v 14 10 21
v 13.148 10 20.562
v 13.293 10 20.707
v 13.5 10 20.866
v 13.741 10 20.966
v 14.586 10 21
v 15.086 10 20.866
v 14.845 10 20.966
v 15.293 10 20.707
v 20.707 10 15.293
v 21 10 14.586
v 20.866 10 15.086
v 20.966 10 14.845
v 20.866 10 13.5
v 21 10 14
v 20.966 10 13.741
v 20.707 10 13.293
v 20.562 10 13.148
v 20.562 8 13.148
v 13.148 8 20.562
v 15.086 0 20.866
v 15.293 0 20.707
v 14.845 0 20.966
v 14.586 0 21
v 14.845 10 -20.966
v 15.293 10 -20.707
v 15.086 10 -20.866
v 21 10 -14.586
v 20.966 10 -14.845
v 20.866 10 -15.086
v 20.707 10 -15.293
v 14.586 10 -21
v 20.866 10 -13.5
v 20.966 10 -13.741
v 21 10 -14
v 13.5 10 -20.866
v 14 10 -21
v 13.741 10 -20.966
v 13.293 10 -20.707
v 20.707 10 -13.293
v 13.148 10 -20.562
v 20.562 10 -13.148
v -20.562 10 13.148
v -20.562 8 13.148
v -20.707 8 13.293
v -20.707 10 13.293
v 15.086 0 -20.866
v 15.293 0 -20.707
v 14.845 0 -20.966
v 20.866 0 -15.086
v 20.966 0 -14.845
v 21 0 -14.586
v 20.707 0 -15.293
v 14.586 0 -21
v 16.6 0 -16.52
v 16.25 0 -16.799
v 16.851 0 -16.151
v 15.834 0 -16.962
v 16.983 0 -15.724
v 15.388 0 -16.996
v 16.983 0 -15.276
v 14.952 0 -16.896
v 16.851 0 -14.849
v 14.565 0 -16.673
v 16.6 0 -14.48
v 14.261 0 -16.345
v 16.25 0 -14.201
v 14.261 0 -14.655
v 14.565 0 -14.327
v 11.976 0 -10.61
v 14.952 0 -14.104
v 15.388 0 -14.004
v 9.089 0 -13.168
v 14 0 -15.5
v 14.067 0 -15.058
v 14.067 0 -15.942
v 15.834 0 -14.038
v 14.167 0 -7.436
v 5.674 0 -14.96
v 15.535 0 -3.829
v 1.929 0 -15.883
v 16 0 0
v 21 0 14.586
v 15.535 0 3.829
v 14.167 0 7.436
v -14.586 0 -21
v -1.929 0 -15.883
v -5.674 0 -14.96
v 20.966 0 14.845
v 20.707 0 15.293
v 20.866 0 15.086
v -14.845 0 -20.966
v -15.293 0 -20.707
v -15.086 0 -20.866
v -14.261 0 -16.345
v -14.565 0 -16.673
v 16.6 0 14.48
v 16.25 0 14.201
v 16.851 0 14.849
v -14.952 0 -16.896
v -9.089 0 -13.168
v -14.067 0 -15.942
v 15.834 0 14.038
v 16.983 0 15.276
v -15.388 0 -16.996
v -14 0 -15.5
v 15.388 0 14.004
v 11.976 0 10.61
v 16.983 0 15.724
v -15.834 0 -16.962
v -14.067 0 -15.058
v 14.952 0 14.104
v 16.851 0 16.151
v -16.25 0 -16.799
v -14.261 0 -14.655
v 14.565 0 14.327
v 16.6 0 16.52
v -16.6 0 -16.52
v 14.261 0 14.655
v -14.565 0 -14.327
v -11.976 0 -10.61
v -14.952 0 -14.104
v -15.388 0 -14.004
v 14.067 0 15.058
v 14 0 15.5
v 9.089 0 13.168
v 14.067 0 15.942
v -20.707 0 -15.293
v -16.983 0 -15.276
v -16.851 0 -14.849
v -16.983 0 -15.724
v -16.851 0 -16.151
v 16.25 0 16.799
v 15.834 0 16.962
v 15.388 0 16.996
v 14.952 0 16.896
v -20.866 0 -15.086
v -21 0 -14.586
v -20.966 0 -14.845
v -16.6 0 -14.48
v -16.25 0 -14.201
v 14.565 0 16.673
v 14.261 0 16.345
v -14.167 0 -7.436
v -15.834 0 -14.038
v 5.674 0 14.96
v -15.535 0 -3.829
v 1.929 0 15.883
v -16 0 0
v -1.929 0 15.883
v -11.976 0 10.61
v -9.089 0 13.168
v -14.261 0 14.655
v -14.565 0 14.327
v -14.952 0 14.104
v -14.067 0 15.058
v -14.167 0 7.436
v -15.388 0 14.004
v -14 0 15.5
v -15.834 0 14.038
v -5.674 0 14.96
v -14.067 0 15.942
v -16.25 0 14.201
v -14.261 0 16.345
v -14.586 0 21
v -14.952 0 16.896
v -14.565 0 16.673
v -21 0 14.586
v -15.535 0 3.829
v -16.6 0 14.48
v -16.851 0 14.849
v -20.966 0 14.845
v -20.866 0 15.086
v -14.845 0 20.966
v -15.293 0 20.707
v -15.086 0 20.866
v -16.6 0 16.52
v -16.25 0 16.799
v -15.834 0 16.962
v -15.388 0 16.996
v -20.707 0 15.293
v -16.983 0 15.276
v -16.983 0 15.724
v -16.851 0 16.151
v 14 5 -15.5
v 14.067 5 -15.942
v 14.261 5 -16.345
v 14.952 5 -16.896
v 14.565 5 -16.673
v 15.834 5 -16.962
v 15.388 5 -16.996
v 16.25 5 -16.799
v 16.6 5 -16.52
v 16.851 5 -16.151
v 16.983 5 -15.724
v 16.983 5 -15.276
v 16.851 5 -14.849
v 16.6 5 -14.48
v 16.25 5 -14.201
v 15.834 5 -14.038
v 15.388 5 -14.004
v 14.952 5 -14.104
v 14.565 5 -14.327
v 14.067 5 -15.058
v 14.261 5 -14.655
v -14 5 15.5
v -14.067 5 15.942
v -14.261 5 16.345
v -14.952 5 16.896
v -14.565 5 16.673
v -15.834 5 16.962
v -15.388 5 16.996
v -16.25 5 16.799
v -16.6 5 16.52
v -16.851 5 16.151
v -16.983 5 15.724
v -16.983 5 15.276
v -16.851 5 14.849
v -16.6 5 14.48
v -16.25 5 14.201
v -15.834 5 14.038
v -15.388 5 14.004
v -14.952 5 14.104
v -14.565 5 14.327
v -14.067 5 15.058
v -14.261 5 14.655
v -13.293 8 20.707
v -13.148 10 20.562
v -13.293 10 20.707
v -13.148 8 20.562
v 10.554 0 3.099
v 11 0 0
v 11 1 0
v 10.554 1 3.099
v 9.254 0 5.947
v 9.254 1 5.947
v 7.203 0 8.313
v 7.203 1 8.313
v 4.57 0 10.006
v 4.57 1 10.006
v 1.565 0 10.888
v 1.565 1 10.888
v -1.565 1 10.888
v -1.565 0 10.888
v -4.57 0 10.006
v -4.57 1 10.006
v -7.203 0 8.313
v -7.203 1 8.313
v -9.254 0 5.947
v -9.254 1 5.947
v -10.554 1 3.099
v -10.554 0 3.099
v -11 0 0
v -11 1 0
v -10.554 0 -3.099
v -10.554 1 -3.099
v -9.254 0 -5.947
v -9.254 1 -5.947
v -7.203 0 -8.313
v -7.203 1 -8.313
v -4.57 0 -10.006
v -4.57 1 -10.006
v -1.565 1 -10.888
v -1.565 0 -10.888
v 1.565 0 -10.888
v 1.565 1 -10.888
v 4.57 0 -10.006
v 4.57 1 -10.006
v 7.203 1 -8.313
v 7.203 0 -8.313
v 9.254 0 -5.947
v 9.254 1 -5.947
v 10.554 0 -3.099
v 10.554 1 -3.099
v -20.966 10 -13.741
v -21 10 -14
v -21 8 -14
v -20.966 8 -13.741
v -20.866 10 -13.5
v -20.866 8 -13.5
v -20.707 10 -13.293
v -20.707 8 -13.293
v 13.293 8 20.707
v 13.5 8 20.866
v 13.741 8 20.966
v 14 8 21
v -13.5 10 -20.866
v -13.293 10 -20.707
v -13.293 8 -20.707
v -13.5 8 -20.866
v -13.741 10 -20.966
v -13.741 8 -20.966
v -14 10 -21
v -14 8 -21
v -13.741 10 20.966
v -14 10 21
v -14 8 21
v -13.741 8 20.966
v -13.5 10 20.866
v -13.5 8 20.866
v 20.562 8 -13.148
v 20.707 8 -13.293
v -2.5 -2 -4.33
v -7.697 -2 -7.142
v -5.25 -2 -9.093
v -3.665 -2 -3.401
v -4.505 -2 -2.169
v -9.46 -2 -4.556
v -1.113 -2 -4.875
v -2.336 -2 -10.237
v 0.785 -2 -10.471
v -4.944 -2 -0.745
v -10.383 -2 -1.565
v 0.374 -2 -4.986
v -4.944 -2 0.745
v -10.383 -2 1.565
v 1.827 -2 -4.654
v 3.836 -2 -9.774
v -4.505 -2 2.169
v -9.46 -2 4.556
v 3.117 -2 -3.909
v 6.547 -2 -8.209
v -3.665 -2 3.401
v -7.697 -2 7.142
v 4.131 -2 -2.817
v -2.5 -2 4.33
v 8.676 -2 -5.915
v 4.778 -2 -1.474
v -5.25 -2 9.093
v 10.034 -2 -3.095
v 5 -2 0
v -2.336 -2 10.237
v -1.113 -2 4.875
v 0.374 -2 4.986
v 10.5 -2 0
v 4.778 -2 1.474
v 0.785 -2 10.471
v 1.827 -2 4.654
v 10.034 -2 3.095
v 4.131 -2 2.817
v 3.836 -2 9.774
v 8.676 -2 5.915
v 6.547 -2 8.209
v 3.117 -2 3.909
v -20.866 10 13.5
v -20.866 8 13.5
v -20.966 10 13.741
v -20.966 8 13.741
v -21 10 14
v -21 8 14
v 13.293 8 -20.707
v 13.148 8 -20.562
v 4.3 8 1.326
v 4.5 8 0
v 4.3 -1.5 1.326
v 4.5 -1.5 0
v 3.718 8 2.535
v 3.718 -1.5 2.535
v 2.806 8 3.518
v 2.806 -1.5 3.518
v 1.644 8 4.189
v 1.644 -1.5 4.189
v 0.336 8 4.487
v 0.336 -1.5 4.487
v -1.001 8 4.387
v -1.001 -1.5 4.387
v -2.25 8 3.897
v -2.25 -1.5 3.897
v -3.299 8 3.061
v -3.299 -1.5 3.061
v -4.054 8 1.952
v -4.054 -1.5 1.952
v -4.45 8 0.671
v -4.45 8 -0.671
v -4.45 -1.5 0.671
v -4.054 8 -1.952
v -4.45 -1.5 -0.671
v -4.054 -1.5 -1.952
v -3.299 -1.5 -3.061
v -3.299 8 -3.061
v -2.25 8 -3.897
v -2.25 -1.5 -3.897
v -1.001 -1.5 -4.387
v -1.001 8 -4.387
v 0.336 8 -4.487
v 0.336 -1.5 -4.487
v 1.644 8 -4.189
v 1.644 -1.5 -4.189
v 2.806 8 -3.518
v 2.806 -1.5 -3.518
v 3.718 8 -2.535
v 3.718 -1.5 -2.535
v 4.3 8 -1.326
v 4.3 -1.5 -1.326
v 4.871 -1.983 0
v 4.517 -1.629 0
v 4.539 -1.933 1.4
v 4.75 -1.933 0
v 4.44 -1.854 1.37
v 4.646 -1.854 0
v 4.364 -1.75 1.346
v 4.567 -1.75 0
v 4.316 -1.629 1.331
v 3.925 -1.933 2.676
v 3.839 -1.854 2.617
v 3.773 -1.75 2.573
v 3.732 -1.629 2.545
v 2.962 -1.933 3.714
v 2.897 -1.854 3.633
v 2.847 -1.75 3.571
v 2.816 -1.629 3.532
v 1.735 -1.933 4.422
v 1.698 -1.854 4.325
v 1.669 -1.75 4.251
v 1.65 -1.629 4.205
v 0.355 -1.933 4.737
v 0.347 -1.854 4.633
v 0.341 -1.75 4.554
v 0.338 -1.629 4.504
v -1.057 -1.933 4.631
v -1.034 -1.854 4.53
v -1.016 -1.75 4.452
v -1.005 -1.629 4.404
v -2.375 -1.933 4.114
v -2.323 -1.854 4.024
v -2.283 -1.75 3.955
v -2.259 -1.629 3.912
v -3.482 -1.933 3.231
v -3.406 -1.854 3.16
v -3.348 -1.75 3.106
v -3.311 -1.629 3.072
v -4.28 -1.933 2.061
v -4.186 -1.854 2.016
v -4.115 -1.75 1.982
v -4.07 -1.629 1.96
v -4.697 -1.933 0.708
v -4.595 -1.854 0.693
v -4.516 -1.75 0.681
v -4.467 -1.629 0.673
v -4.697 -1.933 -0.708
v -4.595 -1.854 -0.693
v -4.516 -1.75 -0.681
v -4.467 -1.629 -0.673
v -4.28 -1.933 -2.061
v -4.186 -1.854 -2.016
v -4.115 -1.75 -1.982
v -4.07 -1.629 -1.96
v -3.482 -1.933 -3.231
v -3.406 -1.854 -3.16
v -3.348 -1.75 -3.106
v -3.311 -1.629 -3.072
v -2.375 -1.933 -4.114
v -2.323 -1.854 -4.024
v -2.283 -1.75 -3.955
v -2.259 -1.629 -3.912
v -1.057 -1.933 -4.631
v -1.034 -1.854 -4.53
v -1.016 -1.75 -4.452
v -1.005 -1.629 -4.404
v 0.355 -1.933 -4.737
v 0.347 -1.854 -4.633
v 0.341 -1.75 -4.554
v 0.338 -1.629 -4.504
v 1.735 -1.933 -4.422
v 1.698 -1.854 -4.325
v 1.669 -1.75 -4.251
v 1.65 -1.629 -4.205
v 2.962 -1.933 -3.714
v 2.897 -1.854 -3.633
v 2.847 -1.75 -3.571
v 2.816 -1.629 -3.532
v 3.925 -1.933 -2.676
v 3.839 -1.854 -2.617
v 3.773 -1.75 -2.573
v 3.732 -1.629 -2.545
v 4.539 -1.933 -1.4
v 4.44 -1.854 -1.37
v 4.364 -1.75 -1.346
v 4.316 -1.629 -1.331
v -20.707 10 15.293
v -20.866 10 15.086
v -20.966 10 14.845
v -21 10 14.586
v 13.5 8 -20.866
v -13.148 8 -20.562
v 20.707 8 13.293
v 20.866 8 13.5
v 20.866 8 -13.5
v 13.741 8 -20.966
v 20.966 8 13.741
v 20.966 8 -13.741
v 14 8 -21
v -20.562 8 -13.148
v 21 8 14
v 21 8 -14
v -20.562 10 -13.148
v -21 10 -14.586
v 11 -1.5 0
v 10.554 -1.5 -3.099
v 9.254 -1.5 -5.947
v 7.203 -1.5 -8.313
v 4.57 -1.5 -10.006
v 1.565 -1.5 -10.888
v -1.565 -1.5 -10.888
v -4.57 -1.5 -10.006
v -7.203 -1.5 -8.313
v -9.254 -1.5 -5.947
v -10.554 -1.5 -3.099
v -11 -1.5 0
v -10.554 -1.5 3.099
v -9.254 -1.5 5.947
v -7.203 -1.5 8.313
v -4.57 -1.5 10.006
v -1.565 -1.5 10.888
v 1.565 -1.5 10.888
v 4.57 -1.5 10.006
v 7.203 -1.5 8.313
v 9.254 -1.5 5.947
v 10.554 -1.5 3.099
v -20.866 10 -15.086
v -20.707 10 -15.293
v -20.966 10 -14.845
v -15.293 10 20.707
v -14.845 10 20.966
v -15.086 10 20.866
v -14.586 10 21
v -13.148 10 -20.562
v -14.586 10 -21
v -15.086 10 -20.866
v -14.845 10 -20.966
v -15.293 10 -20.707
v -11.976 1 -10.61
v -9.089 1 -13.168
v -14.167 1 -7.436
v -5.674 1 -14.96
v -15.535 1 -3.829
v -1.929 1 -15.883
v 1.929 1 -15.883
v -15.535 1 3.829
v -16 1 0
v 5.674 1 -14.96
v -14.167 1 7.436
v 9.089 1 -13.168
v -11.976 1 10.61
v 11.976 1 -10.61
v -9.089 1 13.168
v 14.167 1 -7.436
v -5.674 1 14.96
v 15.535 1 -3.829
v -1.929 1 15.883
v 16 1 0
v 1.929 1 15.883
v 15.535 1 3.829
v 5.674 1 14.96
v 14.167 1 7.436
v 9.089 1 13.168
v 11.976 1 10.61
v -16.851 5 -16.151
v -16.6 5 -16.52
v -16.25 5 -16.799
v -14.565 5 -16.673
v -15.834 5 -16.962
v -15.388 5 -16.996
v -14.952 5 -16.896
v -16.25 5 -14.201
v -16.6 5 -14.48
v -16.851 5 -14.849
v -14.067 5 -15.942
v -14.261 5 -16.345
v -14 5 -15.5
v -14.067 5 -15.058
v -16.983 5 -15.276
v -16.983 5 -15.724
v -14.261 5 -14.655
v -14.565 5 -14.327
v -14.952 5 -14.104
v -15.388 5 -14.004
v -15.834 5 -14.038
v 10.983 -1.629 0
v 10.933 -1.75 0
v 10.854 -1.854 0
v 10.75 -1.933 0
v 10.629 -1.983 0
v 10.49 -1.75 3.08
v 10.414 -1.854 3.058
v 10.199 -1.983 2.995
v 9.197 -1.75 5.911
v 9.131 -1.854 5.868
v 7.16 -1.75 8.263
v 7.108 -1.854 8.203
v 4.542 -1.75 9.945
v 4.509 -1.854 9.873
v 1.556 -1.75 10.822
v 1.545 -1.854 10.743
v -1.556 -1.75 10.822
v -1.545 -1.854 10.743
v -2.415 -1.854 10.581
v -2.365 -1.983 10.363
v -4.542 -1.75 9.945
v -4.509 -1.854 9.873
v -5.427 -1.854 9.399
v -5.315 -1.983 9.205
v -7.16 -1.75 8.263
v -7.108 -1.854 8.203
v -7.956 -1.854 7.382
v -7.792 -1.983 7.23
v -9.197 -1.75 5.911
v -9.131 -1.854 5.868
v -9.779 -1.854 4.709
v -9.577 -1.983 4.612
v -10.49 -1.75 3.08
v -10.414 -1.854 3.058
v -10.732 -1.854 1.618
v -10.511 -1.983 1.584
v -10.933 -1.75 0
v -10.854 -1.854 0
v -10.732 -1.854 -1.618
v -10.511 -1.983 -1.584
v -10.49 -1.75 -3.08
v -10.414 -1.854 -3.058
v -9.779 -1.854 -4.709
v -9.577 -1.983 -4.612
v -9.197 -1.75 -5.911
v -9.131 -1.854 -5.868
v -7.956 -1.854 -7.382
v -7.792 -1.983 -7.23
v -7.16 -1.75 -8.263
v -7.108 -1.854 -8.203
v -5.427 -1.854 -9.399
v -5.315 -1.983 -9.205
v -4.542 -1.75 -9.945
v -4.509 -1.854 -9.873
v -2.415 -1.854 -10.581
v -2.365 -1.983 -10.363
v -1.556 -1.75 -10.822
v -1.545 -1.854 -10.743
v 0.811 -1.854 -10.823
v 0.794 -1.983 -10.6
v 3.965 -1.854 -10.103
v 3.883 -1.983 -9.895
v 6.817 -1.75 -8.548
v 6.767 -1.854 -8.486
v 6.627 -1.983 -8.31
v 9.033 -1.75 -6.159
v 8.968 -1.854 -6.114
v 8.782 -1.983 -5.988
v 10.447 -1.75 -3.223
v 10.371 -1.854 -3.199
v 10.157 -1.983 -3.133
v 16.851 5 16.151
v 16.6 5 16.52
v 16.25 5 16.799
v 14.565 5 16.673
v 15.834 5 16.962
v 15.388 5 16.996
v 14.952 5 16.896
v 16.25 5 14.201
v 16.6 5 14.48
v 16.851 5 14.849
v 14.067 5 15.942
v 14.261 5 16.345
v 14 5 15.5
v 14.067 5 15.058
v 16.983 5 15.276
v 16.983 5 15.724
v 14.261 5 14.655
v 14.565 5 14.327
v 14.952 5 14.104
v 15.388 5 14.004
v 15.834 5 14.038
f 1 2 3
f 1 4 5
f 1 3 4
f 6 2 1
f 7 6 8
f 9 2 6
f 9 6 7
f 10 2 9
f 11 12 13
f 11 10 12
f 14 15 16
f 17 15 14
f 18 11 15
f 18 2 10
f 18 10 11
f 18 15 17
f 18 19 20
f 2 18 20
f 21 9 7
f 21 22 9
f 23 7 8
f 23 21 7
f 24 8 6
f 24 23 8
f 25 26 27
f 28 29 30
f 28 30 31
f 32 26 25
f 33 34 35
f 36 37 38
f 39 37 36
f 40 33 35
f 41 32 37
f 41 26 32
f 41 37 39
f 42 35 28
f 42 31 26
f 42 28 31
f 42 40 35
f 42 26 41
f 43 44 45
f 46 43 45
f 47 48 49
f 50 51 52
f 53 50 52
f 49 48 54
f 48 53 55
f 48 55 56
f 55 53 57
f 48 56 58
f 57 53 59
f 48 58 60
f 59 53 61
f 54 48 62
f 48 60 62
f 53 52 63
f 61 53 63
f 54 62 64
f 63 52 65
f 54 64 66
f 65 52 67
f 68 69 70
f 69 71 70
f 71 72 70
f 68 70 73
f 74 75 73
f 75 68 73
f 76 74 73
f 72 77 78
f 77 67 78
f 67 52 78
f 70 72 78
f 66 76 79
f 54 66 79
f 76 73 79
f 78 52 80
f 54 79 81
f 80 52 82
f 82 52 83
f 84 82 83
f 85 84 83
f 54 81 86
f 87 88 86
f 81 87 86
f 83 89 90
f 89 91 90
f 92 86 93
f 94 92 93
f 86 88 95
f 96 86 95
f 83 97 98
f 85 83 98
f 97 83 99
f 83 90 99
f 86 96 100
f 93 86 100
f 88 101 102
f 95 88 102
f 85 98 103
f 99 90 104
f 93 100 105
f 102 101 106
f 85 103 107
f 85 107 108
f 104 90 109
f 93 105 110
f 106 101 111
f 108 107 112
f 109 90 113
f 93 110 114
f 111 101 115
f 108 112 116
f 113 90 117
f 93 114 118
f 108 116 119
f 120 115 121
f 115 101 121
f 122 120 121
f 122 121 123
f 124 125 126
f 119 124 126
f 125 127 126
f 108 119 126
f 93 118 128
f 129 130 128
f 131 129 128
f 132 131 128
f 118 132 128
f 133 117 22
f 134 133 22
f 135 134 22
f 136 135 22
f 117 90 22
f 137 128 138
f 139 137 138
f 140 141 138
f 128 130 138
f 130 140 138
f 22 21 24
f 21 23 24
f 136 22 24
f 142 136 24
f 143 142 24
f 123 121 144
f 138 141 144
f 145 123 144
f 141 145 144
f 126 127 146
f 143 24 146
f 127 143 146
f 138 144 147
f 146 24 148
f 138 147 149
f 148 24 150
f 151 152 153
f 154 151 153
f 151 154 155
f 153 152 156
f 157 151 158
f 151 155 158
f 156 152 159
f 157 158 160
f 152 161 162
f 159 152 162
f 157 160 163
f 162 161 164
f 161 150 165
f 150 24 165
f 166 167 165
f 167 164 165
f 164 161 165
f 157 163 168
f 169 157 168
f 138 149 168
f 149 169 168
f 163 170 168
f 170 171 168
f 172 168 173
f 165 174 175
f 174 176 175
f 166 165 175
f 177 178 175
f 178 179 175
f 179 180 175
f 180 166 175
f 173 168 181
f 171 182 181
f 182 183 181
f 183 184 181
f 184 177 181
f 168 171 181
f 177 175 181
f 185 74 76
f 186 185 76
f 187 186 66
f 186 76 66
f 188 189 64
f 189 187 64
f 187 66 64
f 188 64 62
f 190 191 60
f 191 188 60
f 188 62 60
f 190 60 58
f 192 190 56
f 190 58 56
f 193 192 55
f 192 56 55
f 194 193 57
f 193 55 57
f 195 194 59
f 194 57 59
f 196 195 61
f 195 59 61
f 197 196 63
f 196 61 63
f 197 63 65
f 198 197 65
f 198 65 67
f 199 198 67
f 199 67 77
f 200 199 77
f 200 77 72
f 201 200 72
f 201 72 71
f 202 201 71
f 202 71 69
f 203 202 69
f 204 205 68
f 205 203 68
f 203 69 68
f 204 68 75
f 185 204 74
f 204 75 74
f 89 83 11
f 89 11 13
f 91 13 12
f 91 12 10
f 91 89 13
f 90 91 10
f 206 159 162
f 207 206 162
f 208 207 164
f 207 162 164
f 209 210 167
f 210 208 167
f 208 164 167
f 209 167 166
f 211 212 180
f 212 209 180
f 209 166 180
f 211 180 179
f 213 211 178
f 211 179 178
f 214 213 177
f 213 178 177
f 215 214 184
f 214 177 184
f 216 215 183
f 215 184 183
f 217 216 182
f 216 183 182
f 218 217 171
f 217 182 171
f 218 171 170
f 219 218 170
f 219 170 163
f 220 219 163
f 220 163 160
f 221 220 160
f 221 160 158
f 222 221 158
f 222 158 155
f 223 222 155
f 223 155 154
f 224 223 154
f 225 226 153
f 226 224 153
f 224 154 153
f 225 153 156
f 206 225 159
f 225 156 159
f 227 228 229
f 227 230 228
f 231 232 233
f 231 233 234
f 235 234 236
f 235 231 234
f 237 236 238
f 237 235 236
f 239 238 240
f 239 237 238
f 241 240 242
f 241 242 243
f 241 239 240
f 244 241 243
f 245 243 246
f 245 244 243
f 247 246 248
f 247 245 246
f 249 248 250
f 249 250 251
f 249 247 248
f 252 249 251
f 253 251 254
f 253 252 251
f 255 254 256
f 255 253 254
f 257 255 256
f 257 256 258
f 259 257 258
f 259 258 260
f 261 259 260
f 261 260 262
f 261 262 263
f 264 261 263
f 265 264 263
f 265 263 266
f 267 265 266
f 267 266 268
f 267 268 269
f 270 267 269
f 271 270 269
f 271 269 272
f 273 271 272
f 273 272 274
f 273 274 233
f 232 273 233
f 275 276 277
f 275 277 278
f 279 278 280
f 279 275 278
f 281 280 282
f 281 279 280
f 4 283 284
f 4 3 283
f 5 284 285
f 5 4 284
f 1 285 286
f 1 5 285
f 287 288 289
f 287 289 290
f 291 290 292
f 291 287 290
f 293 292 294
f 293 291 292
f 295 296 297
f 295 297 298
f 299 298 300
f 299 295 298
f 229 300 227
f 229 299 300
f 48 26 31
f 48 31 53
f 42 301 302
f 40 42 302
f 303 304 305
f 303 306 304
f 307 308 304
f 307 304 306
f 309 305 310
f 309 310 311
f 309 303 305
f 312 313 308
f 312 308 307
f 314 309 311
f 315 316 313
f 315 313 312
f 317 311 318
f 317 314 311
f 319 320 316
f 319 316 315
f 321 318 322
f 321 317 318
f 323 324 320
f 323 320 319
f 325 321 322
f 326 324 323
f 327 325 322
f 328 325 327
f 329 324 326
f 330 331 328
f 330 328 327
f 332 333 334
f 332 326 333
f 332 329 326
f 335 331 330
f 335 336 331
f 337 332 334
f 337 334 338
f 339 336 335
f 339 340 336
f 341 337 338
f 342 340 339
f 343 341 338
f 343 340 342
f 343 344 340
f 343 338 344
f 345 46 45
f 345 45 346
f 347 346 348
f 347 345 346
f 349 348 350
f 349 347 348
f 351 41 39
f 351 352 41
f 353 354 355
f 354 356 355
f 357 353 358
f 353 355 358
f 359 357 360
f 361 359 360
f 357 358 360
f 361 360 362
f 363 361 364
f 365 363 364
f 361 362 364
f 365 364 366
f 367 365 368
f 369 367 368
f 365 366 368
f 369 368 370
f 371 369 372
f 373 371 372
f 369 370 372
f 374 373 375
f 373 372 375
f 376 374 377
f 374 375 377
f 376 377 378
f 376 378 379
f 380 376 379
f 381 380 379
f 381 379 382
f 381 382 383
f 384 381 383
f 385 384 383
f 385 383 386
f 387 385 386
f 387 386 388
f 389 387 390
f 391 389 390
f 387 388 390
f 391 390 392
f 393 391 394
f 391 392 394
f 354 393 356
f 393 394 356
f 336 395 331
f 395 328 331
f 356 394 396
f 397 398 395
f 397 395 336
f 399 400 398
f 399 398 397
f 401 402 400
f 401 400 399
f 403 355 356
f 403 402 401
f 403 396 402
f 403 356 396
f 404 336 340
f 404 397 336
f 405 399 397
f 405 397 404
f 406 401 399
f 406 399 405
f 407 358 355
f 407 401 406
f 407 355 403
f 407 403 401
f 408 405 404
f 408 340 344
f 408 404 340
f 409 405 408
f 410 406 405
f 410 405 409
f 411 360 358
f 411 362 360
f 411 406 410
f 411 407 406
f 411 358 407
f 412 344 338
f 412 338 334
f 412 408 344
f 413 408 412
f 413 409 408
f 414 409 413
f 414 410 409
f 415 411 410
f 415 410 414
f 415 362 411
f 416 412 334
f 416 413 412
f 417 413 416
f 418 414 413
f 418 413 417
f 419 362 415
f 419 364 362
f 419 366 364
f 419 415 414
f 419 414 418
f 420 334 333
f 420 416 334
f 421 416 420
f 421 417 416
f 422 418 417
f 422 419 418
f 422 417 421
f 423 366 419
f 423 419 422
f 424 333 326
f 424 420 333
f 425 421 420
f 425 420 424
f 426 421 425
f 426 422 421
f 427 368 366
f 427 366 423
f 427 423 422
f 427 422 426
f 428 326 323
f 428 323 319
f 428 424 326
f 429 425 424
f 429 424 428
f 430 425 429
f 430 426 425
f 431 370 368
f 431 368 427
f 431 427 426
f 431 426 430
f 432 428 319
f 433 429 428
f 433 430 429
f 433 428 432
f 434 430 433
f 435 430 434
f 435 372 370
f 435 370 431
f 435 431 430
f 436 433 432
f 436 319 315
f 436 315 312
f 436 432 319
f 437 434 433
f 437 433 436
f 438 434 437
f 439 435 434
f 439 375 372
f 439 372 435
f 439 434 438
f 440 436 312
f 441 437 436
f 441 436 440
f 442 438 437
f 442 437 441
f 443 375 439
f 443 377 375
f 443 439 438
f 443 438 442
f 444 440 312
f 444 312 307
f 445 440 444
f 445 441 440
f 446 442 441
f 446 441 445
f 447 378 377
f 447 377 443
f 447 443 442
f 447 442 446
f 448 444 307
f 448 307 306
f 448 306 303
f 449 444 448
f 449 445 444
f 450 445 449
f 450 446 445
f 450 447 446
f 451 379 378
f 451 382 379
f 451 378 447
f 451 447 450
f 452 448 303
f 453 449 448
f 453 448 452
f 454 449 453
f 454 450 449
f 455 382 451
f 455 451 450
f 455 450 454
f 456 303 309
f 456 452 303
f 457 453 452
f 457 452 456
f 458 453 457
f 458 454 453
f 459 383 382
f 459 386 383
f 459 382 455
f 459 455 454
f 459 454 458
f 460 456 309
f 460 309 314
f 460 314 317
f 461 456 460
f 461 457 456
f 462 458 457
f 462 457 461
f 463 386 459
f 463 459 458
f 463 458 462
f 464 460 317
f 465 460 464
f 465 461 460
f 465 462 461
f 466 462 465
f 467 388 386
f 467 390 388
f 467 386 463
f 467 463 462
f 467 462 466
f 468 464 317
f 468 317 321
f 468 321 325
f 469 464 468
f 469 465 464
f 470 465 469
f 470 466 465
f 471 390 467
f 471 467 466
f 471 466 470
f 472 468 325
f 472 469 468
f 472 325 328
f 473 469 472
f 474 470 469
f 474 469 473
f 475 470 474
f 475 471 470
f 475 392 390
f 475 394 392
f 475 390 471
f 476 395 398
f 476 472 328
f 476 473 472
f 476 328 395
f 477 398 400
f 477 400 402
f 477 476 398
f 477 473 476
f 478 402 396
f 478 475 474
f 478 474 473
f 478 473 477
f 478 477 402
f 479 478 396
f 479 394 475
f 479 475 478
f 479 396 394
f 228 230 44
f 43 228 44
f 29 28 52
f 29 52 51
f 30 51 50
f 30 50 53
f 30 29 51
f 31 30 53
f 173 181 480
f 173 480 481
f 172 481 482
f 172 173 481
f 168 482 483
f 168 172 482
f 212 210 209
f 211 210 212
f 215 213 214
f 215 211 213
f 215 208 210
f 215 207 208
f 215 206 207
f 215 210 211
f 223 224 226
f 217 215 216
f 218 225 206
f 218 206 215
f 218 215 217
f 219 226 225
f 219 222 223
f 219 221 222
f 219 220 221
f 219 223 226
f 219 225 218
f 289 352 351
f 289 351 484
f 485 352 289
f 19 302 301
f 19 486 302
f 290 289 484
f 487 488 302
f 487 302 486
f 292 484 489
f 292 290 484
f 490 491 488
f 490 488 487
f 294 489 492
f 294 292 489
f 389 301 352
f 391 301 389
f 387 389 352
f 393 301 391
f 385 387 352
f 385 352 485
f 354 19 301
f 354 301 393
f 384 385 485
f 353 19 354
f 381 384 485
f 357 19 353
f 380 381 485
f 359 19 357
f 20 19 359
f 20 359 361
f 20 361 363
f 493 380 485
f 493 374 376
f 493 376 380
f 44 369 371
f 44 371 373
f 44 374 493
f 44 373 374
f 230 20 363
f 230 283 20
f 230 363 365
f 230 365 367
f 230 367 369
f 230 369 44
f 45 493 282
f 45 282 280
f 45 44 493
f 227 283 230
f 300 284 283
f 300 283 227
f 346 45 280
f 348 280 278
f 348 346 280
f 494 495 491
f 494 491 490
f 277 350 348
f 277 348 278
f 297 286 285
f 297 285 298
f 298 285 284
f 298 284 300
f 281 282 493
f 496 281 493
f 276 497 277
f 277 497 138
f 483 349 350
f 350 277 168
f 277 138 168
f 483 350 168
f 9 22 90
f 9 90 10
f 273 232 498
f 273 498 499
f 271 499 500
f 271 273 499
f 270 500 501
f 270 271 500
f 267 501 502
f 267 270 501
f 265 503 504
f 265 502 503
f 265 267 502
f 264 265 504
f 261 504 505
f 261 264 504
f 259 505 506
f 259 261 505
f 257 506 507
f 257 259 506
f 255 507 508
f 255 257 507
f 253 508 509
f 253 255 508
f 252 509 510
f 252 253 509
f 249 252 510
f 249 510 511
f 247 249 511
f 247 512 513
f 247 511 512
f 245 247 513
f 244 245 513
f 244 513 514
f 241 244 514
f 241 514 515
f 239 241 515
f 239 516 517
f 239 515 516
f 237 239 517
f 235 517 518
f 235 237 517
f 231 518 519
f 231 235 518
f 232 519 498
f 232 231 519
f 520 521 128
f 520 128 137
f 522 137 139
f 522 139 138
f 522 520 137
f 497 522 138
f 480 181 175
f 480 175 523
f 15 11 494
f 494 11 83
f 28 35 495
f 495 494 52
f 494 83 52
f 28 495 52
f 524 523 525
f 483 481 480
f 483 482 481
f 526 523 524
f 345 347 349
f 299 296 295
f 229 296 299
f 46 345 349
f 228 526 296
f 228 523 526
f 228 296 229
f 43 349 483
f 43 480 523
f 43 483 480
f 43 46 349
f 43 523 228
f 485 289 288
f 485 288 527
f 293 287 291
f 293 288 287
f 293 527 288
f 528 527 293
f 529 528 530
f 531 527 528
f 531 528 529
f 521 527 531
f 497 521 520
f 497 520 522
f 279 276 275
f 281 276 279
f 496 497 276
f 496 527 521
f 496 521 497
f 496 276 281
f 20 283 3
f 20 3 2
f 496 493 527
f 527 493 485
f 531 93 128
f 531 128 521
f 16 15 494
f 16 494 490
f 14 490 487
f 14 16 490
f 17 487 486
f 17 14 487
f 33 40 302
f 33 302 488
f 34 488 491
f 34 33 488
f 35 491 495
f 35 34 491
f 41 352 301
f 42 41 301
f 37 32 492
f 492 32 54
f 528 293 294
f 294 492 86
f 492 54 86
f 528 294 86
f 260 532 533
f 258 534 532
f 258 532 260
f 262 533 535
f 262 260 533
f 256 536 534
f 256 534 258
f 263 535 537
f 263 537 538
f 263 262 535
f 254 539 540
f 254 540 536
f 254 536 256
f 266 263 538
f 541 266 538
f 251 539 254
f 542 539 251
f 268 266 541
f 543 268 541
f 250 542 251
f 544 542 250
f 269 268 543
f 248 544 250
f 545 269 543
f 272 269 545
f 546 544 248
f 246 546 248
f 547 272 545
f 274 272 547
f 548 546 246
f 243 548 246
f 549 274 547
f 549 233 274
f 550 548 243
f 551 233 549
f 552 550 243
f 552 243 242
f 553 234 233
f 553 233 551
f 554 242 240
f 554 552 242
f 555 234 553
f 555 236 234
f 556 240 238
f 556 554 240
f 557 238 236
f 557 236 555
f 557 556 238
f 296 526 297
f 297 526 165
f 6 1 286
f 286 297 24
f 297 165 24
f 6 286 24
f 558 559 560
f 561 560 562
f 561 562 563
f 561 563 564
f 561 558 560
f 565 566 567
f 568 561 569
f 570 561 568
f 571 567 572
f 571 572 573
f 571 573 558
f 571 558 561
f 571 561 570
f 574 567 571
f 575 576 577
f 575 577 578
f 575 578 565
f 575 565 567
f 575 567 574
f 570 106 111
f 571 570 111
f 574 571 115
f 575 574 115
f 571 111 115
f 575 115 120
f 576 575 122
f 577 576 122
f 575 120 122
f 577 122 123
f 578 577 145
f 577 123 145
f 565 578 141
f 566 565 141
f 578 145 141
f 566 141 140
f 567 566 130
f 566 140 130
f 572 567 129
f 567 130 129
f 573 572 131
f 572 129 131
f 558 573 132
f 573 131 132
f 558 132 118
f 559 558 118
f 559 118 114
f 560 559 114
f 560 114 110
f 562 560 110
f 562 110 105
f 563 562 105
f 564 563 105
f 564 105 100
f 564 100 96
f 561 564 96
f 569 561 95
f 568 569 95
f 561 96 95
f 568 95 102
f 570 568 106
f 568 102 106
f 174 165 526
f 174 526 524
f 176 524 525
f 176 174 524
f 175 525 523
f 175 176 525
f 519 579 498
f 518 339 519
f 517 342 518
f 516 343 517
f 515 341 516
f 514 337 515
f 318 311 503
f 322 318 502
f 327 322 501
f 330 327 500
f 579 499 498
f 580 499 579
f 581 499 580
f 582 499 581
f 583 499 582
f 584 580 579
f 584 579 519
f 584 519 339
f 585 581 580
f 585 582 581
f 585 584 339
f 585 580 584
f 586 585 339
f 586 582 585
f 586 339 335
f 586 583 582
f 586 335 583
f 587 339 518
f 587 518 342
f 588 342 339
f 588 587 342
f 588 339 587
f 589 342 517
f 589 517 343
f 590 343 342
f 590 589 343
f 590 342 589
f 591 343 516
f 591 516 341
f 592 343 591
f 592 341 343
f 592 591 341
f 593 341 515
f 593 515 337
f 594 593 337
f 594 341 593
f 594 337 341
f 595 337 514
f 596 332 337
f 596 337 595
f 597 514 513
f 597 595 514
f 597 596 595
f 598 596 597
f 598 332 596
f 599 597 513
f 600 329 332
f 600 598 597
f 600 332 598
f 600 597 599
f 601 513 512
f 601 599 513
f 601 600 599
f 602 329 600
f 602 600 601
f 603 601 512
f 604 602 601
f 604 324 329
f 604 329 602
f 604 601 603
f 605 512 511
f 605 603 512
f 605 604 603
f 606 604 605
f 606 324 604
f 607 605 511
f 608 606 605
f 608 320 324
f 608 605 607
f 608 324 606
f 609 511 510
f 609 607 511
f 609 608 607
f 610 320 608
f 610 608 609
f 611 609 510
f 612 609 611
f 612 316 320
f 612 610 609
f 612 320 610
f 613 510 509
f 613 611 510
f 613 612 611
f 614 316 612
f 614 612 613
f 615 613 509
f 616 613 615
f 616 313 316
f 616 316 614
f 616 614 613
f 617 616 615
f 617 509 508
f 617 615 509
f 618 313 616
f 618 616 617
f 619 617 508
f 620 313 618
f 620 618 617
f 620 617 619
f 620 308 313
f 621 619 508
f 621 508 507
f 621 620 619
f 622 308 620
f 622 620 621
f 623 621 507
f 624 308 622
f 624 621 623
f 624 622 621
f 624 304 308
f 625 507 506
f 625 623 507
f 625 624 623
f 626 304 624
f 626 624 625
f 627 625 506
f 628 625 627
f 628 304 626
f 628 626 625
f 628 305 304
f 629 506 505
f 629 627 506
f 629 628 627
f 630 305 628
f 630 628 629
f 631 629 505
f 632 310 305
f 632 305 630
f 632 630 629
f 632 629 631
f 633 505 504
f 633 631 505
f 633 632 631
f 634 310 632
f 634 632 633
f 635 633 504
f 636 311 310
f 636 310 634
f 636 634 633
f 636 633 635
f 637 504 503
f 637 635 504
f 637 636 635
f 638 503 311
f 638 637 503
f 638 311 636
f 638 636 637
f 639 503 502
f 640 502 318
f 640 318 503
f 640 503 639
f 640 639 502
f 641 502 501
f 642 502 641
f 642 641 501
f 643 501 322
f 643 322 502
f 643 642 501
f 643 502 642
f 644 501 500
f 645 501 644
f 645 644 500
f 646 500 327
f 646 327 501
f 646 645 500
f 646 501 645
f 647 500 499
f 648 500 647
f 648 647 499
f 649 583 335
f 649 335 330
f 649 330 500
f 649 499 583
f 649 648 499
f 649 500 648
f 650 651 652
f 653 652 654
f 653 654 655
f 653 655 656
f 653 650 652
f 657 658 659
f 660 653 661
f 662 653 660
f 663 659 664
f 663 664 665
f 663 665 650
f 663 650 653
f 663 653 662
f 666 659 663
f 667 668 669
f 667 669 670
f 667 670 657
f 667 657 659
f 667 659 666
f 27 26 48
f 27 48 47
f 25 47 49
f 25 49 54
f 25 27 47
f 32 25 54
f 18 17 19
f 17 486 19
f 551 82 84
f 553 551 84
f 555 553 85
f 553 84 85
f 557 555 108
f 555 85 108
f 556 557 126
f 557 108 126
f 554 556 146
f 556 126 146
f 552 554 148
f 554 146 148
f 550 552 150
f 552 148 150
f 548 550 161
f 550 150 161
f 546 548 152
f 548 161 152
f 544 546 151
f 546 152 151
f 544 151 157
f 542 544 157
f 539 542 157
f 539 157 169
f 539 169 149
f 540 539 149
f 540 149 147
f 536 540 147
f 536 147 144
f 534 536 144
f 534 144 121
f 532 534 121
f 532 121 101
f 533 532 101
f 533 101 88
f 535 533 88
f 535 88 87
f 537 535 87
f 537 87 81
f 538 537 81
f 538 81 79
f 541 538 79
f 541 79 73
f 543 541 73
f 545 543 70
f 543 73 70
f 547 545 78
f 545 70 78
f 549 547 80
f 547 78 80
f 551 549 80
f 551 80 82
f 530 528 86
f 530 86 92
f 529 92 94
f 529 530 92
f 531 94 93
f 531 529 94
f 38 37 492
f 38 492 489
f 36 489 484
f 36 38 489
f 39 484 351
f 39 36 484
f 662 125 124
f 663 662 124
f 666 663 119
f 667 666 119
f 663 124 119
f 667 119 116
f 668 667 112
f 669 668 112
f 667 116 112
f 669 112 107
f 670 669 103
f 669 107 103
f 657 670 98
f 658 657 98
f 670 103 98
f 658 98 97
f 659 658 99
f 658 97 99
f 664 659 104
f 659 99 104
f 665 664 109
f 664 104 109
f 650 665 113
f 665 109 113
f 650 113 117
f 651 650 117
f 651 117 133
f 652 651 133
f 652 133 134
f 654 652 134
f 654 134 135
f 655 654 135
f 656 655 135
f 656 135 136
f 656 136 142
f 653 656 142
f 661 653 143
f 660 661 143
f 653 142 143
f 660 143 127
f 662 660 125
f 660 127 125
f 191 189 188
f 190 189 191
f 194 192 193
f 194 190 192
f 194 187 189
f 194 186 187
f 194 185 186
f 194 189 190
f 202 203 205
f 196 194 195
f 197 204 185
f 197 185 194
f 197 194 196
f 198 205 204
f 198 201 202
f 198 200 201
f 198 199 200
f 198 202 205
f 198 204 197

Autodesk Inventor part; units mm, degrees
ref_plane "YZ Plane" through (0, 0, 0) normal (1, 0, 0) x (0, 1, 0)
ref_plane "XZ Plane" through (0, 0, 0) normal (0, 1, 0) x (-1, 0, 0)
ref_plane "XY Plane" through (0, 0, 0) normal (0, 0, 1) x (1, 0, 0)
sketch "Sketch1" plane through (0, 0, 0) normal (0, 1, 0) x (-1, 0, 0)
  line L0 (-21, -21) -> (21, -21)
  line L1 (21, -21) -> (21, 21)
  line L2 (21, 21) -> (-21, 21)
  line L3 (-21, 21) -> (-21, -21)
  line L4 (-21, -21) -> (21, 21) construction
  line L5 (21, -21) -> (-21, 21) construction
  point P0 (0, 0)
  dimension "d0" = 42
  dimension "d1" = 42
extrude "Extrusion1" add sketch "Sketch1" along normal blind 8
sketch "Sketch2" plane through (0, 0, 0) normal (0, -1, 0) x (1, 0, 0)
  point P0 (0, 0)
chamfer "Chamfer1" distance 6 angle 45 4 edges at (-21, 4, 21) (21, 4, 21) (21, 4, -21) (-21, 4, -21)
sketch "Sketch3" plane through (0, 8, 0) normal (0, 1, 0) x (1, 0, 0)
  line L0 (-21, 15) -> (-15, 21) projected
  line L1 (-21, 15) -> (-21, -15) projected
  line L2 (-15, -21) -> (-21, -15) projected
  line L3 (-15, -21) -> (15, -21) projected
  line L4 (21, -15) -> (15, -21) projected
  line L5 (21, -15) -> (21, 15) projected
  line L6 (15, 21) -> (21, 15) projected
  line L7 (15, 21) -> (-15, 21) projected
  line L8 (-19.6609, -14.0495) -> (-13.6609, -20.0495)
  line L9 (-15, -21) -> (-21, -15) projected
  line L10 (-21, -15) -> (-19.8552, -13.8552)
  line L11 (-19.8552, -13.8552) -> (-19.6609, -14.0495)
  line L12 (-15, -21) -> (-13.8552, -19.8552)
  line L13 (-13.6609, -20.0495) -> (-13.1481, -20.5623)
  line L14 (-13.1481, -20.5623) -> (-13.5858, -21)
  line L15 (-19.8552, -13.8552) -> (-20.5623, -13.1481)
  line L16 (-20.5623, -13.1481) -> (-21, -13.5858)
  point P0 (0, 0)
  dimension "d11" = 1
  dimension "d12" = 1
extrude "Extrusion2" add sketch "Sketch3" along normal blind 2 contours L16 L15 L10 L1 | L10 L11 L8 L12 L2 | L12 L8 L13 L14 L3
mirror "Mirror1" about plane through (0, 0, 0) normal (0, 0, 1) of "Extrusion2"
mirror "Mirror2" about plane through (0, 0, 0) normal (1, 0, 0) of "Extrusion2", "Mirror1"
fillet "Fillet2" radius 1 8 edges at (15, 5, -21) (21, 5, -15) (21, 5, 15) (15, 5, 21) (-15, 5, 21) (-21, 5, 15) (-21, 5, -15) (-15, 5, -21)
fillet "Fillet3" radius 1 8 edges at (-21, 9, 13.5858) (-13.5858, 9, 21) (13.5858, 9, 21) (21, 9, 13.5858) (21, 9, -13.5858) (13.5858, 9, -21) (-13.5858, 9, -21) (-21, 9, -13.5858)
sketch "Sketch4" plane through (0, 0, 0) normal (0, -1, 0) x (1, 0, 0)
  circle A0 centre (0, 0) radius 16
  circle A1 centre (0, 0) radius 11
  dimension "d14" = 32
  dimension "d15" = 22
extrude "Extrusion3" cut sketch "Sketch4" against normal blind 1
sketch "Sketch5" plane through (0, 0, 0) normal (0, -1, 0) x (1, 0, 0)
  circle A0 centre (0, 0) radius 11 projected
extrude "Extrusion4" add sketch "Sketch5" along normal blind 2
sketch "Sketch6" plane through (0, -2, 0) normal (0, -1, 0) x (1, 0, 0)
  circle A0 centre (0, 0) radius 4.5
  dimension "d20" = 9
extrude "Extrusion5" cut sketch "Sketch6" against normal up to surface (10 mm away)
sketch "Sketch7" plane through (0, 0, 0) normal (0, -1, 0) x (1, 0, 0)
  point P0 (0, 0)
sketch "Sketch8" plane through (0, 0, 0) normal (0, -1, 0) x (1, 0, 0)
  circle A0 centre (-15.5, -15.5) radius 1.5
  line L0 (14.5858, -21) -> (-14.5858, -21) projected
  line L1 (-21, -14.5858) -> (-21, 14.5858) projected
  point P0 (0, 0)
  dimension "d23" = 3
  dimension "d24" = 5.5
  dimension "d25" = 5.5
extrude "Extrusion6" cut sketch "Sketch8" against normal blind 5
mirror "Mirror3" about plane through (0, 0, 0) normal (0, 0, 1) of "Extrusion6"
mirror "Mirror4" about plane through (0, 0, 0) normal (1, 0, 0) of "Extrusion6", "Mirror3"
fillet "Fillet4" radius 0.5 1 edges at (-11, -2, 0)
fillet "Fillet5" radius 0.5 1 edges at (-4.5, -2, 0)
equation "\"d12\" = d11"
equation "\"d25\" = d24"
